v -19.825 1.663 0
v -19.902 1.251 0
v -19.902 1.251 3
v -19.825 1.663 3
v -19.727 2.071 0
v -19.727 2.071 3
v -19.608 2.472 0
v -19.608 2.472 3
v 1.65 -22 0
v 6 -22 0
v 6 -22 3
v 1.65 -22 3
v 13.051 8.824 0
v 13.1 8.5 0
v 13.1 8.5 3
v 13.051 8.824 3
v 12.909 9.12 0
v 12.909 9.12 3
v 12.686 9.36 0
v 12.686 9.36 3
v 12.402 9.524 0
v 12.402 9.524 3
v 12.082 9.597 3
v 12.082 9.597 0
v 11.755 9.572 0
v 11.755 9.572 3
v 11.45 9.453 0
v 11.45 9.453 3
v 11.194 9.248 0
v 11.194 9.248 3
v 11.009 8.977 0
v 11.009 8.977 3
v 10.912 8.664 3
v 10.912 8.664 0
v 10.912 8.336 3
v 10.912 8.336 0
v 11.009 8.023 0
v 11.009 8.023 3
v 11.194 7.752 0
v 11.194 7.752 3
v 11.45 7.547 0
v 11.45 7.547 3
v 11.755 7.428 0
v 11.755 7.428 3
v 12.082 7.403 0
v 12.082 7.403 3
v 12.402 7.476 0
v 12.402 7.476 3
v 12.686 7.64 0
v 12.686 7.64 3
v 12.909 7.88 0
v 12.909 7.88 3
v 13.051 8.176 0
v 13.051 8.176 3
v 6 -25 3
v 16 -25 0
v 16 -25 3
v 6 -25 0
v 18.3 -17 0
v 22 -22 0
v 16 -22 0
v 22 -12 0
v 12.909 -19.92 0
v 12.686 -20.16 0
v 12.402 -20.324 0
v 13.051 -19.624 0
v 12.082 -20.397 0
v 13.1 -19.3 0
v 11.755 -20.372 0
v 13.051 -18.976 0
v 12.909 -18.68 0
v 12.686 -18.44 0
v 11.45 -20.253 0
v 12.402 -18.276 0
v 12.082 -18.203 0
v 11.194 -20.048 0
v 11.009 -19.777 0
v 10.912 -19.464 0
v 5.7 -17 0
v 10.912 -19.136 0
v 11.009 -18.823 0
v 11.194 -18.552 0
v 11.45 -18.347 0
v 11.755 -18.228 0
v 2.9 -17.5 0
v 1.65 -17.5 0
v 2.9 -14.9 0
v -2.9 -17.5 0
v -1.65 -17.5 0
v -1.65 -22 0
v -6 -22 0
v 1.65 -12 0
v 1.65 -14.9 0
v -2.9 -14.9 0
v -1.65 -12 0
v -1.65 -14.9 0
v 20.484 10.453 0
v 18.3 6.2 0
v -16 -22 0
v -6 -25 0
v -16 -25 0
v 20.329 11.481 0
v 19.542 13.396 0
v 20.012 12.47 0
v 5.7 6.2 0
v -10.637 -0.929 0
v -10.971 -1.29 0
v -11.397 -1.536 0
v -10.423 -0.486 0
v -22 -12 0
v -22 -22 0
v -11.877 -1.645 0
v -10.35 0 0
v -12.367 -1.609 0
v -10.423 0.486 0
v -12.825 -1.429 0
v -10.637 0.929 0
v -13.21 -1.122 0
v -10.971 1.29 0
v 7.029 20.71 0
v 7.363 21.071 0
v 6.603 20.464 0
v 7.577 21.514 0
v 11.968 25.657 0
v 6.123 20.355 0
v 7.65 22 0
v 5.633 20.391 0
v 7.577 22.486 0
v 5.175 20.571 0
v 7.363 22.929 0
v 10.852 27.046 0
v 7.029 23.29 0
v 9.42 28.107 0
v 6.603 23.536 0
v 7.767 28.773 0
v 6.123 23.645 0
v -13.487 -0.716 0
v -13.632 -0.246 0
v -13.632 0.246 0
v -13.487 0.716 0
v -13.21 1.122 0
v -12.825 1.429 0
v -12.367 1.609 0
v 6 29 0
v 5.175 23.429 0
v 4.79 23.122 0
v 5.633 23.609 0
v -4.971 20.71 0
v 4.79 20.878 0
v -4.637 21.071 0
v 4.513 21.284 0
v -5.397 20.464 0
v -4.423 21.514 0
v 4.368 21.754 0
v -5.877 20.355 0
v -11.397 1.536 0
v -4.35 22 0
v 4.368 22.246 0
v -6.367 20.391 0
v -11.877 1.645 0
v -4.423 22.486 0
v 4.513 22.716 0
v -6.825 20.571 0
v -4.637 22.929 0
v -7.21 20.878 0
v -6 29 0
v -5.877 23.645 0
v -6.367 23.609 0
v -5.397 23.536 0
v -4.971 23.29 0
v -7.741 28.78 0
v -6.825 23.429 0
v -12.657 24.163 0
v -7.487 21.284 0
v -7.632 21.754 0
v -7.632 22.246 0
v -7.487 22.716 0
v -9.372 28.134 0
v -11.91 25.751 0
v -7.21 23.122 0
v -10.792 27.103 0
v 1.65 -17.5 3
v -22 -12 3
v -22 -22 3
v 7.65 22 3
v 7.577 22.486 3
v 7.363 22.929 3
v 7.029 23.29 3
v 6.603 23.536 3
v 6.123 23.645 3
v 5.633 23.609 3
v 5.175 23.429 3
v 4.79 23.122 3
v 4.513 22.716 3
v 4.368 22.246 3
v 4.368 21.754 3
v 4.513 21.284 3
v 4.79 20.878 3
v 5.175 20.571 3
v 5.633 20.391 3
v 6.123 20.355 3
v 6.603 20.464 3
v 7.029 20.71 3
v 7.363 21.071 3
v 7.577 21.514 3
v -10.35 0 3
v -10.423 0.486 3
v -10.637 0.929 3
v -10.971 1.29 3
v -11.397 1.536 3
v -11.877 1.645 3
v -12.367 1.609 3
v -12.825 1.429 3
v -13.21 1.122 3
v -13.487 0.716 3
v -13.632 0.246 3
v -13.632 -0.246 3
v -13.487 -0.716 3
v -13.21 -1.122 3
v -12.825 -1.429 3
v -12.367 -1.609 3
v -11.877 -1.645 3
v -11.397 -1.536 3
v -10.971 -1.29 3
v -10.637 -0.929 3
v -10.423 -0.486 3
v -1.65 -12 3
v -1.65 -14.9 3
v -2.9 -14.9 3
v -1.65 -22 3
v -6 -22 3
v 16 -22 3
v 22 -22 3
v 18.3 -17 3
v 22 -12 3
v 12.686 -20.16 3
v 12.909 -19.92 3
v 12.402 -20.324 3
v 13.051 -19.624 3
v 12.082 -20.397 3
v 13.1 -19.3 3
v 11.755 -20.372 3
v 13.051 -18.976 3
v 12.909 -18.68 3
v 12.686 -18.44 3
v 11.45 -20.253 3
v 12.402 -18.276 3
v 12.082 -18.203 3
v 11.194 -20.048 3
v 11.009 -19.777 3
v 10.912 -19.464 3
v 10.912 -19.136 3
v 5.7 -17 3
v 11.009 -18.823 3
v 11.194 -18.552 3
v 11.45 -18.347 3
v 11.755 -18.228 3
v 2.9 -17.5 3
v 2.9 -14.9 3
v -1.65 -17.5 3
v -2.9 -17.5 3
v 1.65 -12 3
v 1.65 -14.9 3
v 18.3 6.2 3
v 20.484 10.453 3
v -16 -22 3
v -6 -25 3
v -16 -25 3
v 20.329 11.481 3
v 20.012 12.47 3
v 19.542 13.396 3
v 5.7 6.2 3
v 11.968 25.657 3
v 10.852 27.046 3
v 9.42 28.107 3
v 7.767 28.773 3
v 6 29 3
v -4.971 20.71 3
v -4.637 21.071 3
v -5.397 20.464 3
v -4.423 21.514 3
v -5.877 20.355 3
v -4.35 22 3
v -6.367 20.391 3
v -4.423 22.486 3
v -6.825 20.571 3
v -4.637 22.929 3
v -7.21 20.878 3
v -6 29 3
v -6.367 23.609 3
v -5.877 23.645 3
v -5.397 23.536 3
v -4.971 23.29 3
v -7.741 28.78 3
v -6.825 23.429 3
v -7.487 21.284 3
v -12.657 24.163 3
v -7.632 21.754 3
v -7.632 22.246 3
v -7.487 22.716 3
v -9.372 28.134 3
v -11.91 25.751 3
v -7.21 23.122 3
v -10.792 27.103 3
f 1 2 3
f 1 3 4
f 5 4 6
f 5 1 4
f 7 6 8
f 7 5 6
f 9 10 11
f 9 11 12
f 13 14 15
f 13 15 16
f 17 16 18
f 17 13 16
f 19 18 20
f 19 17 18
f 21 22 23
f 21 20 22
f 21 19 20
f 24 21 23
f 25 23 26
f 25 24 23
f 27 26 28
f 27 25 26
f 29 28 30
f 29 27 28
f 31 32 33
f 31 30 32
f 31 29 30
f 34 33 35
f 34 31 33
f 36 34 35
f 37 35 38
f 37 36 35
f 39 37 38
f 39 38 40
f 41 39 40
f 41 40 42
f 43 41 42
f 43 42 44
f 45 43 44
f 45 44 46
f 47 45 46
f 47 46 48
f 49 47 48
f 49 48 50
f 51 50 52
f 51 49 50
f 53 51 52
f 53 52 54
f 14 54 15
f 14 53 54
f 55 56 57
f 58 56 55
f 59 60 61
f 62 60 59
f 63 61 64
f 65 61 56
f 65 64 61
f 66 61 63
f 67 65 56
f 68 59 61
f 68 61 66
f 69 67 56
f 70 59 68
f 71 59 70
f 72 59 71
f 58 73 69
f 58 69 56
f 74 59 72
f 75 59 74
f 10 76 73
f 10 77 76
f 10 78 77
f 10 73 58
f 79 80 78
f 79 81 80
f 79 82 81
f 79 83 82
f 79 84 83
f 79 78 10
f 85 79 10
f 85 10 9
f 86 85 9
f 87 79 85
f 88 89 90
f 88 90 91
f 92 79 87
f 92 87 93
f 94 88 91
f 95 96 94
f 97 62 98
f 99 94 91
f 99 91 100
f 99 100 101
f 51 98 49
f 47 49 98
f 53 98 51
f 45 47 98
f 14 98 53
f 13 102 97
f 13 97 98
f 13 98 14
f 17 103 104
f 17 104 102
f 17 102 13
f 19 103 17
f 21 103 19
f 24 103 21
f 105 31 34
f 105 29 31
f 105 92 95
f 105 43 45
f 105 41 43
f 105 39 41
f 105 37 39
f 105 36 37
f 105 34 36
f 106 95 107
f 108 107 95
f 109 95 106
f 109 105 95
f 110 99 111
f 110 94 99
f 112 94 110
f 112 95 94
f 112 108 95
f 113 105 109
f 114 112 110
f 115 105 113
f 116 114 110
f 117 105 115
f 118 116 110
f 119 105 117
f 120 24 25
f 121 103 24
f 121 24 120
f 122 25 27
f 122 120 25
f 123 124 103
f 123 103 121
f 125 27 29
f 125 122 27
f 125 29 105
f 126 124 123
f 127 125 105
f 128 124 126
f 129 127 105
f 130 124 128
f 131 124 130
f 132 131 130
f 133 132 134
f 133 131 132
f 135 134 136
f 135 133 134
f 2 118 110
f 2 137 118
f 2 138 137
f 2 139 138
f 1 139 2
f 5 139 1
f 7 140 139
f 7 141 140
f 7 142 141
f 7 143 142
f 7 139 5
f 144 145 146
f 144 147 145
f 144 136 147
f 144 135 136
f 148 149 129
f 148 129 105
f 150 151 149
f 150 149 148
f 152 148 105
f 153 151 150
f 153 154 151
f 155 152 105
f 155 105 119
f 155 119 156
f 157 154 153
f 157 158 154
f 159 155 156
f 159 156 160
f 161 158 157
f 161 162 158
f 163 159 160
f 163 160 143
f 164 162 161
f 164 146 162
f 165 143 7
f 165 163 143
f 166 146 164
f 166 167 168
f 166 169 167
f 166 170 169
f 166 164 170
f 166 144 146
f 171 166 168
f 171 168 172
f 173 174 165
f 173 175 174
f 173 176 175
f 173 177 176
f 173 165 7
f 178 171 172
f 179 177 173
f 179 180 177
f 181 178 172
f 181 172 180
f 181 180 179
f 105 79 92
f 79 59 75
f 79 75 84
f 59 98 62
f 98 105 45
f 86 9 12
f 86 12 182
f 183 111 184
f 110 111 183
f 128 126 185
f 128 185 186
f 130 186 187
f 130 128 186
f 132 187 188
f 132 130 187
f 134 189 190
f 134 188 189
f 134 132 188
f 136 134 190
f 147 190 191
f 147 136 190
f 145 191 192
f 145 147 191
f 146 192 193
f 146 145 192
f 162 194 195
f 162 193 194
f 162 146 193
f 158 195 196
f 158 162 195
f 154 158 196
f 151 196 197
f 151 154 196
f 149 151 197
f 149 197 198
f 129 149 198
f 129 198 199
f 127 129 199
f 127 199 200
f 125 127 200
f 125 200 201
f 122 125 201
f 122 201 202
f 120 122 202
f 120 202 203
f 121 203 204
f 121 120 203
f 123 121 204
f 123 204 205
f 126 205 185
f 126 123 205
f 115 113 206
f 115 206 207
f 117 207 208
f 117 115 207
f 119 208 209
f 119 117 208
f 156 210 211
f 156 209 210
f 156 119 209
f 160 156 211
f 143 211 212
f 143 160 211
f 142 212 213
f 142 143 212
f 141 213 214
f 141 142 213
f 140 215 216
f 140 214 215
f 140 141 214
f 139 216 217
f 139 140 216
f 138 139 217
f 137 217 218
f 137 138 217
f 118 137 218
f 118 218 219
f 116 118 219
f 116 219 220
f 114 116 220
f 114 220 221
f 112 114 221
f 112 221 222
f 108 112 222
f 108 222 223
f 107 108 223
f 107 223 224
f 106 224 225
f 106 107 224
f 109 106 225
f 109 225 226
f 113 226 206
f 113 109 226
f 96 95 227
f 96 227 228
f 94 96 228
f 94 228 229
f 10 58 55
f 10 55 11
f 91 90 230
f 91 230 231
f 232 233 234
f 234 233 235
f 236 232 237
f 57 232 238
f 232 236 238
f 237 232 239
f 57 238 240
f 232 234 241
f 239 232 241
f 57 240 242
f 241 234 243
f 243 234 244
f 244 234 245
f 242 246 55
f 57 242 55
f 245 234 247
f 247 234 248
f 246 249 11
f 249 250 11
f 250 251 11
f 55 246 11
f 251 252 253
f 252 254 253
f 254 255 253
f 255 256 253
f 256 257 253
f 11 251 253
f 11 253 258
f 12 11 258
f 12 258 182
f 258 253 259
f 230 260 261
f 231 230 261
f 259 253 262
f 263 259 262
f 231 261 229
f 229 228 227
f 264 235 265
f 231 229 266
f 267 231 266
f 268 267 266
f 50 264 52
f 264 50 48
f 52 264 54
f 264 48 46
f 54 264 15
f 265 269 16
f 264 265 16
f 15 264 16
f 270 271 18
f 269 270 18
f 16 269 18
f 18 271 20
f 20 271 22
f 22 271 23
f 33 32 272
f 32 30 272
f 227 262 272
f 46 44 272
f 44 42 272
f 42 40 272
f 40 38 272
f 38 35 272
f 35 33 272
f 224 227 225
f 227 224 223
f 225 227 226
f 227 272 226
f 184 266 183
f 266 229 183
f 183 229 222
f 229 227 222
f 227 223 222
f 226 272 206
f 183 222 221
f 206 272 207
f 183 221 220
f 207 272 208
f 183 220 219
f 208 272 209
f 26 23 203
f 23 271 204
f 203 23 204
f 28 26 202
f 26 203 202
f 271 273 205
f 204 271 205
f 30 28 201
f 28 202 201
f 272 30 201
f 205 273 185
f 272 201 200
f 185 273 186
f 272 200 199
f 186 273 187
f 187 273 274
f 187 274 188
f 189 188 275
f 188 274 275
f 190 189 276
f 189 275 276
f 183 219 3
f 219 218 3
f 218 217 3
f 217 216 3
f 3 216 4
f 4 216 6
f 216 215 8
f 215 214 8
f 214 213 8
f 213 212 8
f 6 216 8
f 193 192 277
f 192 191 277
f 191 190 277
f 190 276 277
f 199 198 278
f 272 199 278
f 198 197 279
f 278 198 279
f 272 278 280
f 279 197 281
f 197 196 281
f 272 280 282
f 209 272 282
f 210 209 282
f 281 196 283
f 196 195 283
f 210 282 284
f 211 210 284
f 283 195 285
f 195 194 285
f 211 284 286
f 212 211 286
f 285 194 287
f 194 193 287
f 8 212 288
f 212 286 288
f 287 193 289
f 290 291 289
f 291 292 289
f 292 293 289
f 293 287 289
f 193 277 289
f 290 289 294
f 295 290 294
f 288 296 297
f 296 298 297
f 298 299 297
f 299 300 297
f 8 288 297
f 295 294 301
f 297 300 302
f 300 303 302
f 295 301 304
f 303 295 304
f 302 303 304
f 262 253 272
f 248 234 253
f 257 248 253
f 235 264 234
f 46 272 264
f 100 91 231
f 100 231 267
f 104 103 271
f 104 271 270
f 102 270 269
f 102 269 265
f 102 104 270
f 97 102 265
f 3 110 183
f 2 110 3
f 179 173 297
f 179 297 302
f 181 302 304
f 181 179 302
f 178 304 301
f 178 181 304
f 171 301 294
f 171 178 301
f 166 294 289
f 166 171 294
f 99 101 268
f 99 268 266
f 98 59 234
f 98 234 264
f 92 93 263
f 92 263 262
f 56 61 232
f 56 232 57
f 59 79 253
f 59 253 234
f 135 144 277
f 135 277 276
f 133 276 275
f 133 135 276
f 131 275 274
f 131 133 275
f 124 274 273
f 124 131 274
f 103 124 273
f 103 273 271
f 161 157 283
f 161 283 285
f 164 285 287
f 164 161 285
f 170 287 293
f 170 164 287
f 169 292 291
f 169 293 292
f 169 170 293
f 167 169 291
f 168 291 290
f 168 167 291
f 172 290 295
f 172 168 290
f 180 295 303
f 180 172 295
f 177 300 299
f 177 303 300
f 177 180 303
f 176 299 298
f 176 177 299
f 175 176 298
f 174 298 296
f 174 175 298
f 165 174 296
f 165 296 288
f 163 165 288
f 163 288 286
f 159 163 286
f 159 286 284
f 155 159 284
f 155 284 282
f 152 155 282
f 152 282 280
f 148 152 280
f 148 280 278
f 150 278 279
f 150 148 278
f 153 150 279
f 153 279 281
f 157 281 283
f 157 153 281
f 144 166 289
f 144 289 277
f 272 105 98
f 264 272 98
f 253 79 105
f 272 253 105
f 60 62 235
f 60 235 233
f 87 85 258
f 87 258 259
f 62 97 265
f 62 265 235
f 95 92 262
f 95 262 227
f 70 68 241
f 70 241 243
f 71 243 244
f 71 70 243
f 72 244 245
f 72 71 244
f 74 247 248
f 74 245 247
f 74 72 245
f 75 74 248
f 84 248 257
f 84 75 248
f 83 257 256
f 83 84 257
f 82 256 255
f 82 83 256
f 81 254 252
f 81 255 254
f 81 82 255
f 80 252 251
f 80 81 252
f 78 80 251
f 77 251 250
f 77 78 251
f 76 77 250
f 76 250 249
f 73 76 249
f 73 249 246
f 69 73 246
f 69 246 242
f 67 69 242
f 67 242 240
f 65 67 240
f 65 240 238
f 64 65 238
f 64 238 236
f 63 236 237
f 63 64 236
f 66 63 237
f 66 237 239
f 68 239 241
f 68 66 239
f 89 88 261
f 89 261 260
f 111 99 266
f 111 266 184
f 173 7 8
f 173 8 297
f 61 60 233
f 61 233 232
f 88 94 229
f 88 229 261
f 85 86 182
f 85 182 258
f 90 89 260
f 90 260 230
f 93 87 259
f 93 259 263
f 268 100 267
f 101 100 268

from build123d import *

# Parameters (mm, degrees)
ESKIZ_KONTUR_W        = 12.6
ESKIZ_KONTUR_H        = 23.2
PLASTINA_DEPTH        = 3
OTVERSTIYA_DEPTH      = 37.523967755
OTVERSTIYA_DEPTH_BACK = 37.523967755
ESKIZ_OTVERSTIYA_R    = 1.65
ESKIZ_OTVERSTIYA_R_2  = 1.1


with BuildPart() as part:
    # Eskiz_kontur → Plastina (new body)
    with BuildSketch(Plane.XY):
        with BuildLine():
            Line((-19.608453592, 2.472140862), (-12.657403592, 24.163120862))
            ThreePointArc((-12.657403592, 24.163120862), (-10.114503963, 27.663122227), (-6.000005728, 29.000003803))
            Line((-6.000005728, 29.000003803), (5.999994272, 29.000003803))
            ThreePointArc((5.999994272, 29.000003803), (9.420342449, 28.10747607), (11.968474679, 25.657494531))
            Line((11.968474679, 25.657494531), (19.542154679, 13.396244531))
            ThreePointArc((19.542154679, 13.396244531), (20.190566029, 11.981622791), (20.484159934, 10.453423012))
            Line((20.484159934, 10.453423012), (21.999989934, -11.999996988))
            Line((21.999989934, -11.999996988), (21.999989934, -22))
            Line((21.999989934, -22), (16, -22))
            Line((16, -22), (16, -25))
            Line((16, -25), (6, -25))
            Line((6, -25), (6, -22))
            Line((6, -22), (1.65, -22))
            Line((1.65, -22), (1.65, -17.5))
            Line((1.65, -17.5), (2.9, -17.5))
            Line((2.9, -17.5), (2.9, -14.9))
            Line((2.9, -14.9), (1.65, -14.9))
            Line((1.65, -14.9), (1.65, -12))
            Line((1.65, -12), (-1.65, -12))
            Line((-1.65, -12), (-1.65, -14.9))
            Line((-1.65, -14.9), (-2.9, -14.9))
            Line((-2.9, -14.9), (-2.9, -17.5))
            Line((-2.9, -17.5), (-1.65, -17.5))
            Line((-1.65, -17.5), (-1.65, -22))
            Line((-1.65, -22), (-6, -22))
            Line((-6, -22), (-6, -25))
            Line((-6, -25), (-16, -25))
            Line((-16, -25), (-16, -22))
            Line((-16, -22), (-22, -22))
            Line((-22, -22), (-22, -12))
            Line((-22, -12), (-19.90151, 1.25148))
            ThreePointArc((-19.90151, 1.25148), (-19.778961323, 1.867567439), (-19.608453592, 2.472140862))
        make_face()
        with Locations((12, -5.4)):
            Rectangle(ESKIZ_KONTUR_W, ESKIZ_KONTUR_H, mode=Mode.SUBTRACT)
    extrude(amount=PLASTINA_DEPTH)

    # Eskiz_otverstiya → Otverstiya (cut, two sides: drawn at the far end of the back side and taken through both)
    with BuildSketch(Plane.XY.offset(-OTVERSTIYA_DEPTH_BACK)):
        with Locations((-12, 0)):
            Circle(ESKIZ_OTVERSTIYA_R)
        with Locations((12, -19.3)):
            Circle(ESKIZ_OTVERSTIYA_R_2)
        with Locations((-6, 22)):
            Circle(ESKIZ_OTVERSTIYA_R)
        with Locations((12, 8.5)):
            Circle(ESKIZ_OTVERSTIYA_R_2)
        with Locations((6, 22)):
            Circle(ESKIZ_OTVERSTIYA_R)
    extrude(amount=OTVERSTIYA_DEPTH + OTVERSTIYA_DEPTH_BACK, mode=Mode.SUBTRACT)


solid = part.part
